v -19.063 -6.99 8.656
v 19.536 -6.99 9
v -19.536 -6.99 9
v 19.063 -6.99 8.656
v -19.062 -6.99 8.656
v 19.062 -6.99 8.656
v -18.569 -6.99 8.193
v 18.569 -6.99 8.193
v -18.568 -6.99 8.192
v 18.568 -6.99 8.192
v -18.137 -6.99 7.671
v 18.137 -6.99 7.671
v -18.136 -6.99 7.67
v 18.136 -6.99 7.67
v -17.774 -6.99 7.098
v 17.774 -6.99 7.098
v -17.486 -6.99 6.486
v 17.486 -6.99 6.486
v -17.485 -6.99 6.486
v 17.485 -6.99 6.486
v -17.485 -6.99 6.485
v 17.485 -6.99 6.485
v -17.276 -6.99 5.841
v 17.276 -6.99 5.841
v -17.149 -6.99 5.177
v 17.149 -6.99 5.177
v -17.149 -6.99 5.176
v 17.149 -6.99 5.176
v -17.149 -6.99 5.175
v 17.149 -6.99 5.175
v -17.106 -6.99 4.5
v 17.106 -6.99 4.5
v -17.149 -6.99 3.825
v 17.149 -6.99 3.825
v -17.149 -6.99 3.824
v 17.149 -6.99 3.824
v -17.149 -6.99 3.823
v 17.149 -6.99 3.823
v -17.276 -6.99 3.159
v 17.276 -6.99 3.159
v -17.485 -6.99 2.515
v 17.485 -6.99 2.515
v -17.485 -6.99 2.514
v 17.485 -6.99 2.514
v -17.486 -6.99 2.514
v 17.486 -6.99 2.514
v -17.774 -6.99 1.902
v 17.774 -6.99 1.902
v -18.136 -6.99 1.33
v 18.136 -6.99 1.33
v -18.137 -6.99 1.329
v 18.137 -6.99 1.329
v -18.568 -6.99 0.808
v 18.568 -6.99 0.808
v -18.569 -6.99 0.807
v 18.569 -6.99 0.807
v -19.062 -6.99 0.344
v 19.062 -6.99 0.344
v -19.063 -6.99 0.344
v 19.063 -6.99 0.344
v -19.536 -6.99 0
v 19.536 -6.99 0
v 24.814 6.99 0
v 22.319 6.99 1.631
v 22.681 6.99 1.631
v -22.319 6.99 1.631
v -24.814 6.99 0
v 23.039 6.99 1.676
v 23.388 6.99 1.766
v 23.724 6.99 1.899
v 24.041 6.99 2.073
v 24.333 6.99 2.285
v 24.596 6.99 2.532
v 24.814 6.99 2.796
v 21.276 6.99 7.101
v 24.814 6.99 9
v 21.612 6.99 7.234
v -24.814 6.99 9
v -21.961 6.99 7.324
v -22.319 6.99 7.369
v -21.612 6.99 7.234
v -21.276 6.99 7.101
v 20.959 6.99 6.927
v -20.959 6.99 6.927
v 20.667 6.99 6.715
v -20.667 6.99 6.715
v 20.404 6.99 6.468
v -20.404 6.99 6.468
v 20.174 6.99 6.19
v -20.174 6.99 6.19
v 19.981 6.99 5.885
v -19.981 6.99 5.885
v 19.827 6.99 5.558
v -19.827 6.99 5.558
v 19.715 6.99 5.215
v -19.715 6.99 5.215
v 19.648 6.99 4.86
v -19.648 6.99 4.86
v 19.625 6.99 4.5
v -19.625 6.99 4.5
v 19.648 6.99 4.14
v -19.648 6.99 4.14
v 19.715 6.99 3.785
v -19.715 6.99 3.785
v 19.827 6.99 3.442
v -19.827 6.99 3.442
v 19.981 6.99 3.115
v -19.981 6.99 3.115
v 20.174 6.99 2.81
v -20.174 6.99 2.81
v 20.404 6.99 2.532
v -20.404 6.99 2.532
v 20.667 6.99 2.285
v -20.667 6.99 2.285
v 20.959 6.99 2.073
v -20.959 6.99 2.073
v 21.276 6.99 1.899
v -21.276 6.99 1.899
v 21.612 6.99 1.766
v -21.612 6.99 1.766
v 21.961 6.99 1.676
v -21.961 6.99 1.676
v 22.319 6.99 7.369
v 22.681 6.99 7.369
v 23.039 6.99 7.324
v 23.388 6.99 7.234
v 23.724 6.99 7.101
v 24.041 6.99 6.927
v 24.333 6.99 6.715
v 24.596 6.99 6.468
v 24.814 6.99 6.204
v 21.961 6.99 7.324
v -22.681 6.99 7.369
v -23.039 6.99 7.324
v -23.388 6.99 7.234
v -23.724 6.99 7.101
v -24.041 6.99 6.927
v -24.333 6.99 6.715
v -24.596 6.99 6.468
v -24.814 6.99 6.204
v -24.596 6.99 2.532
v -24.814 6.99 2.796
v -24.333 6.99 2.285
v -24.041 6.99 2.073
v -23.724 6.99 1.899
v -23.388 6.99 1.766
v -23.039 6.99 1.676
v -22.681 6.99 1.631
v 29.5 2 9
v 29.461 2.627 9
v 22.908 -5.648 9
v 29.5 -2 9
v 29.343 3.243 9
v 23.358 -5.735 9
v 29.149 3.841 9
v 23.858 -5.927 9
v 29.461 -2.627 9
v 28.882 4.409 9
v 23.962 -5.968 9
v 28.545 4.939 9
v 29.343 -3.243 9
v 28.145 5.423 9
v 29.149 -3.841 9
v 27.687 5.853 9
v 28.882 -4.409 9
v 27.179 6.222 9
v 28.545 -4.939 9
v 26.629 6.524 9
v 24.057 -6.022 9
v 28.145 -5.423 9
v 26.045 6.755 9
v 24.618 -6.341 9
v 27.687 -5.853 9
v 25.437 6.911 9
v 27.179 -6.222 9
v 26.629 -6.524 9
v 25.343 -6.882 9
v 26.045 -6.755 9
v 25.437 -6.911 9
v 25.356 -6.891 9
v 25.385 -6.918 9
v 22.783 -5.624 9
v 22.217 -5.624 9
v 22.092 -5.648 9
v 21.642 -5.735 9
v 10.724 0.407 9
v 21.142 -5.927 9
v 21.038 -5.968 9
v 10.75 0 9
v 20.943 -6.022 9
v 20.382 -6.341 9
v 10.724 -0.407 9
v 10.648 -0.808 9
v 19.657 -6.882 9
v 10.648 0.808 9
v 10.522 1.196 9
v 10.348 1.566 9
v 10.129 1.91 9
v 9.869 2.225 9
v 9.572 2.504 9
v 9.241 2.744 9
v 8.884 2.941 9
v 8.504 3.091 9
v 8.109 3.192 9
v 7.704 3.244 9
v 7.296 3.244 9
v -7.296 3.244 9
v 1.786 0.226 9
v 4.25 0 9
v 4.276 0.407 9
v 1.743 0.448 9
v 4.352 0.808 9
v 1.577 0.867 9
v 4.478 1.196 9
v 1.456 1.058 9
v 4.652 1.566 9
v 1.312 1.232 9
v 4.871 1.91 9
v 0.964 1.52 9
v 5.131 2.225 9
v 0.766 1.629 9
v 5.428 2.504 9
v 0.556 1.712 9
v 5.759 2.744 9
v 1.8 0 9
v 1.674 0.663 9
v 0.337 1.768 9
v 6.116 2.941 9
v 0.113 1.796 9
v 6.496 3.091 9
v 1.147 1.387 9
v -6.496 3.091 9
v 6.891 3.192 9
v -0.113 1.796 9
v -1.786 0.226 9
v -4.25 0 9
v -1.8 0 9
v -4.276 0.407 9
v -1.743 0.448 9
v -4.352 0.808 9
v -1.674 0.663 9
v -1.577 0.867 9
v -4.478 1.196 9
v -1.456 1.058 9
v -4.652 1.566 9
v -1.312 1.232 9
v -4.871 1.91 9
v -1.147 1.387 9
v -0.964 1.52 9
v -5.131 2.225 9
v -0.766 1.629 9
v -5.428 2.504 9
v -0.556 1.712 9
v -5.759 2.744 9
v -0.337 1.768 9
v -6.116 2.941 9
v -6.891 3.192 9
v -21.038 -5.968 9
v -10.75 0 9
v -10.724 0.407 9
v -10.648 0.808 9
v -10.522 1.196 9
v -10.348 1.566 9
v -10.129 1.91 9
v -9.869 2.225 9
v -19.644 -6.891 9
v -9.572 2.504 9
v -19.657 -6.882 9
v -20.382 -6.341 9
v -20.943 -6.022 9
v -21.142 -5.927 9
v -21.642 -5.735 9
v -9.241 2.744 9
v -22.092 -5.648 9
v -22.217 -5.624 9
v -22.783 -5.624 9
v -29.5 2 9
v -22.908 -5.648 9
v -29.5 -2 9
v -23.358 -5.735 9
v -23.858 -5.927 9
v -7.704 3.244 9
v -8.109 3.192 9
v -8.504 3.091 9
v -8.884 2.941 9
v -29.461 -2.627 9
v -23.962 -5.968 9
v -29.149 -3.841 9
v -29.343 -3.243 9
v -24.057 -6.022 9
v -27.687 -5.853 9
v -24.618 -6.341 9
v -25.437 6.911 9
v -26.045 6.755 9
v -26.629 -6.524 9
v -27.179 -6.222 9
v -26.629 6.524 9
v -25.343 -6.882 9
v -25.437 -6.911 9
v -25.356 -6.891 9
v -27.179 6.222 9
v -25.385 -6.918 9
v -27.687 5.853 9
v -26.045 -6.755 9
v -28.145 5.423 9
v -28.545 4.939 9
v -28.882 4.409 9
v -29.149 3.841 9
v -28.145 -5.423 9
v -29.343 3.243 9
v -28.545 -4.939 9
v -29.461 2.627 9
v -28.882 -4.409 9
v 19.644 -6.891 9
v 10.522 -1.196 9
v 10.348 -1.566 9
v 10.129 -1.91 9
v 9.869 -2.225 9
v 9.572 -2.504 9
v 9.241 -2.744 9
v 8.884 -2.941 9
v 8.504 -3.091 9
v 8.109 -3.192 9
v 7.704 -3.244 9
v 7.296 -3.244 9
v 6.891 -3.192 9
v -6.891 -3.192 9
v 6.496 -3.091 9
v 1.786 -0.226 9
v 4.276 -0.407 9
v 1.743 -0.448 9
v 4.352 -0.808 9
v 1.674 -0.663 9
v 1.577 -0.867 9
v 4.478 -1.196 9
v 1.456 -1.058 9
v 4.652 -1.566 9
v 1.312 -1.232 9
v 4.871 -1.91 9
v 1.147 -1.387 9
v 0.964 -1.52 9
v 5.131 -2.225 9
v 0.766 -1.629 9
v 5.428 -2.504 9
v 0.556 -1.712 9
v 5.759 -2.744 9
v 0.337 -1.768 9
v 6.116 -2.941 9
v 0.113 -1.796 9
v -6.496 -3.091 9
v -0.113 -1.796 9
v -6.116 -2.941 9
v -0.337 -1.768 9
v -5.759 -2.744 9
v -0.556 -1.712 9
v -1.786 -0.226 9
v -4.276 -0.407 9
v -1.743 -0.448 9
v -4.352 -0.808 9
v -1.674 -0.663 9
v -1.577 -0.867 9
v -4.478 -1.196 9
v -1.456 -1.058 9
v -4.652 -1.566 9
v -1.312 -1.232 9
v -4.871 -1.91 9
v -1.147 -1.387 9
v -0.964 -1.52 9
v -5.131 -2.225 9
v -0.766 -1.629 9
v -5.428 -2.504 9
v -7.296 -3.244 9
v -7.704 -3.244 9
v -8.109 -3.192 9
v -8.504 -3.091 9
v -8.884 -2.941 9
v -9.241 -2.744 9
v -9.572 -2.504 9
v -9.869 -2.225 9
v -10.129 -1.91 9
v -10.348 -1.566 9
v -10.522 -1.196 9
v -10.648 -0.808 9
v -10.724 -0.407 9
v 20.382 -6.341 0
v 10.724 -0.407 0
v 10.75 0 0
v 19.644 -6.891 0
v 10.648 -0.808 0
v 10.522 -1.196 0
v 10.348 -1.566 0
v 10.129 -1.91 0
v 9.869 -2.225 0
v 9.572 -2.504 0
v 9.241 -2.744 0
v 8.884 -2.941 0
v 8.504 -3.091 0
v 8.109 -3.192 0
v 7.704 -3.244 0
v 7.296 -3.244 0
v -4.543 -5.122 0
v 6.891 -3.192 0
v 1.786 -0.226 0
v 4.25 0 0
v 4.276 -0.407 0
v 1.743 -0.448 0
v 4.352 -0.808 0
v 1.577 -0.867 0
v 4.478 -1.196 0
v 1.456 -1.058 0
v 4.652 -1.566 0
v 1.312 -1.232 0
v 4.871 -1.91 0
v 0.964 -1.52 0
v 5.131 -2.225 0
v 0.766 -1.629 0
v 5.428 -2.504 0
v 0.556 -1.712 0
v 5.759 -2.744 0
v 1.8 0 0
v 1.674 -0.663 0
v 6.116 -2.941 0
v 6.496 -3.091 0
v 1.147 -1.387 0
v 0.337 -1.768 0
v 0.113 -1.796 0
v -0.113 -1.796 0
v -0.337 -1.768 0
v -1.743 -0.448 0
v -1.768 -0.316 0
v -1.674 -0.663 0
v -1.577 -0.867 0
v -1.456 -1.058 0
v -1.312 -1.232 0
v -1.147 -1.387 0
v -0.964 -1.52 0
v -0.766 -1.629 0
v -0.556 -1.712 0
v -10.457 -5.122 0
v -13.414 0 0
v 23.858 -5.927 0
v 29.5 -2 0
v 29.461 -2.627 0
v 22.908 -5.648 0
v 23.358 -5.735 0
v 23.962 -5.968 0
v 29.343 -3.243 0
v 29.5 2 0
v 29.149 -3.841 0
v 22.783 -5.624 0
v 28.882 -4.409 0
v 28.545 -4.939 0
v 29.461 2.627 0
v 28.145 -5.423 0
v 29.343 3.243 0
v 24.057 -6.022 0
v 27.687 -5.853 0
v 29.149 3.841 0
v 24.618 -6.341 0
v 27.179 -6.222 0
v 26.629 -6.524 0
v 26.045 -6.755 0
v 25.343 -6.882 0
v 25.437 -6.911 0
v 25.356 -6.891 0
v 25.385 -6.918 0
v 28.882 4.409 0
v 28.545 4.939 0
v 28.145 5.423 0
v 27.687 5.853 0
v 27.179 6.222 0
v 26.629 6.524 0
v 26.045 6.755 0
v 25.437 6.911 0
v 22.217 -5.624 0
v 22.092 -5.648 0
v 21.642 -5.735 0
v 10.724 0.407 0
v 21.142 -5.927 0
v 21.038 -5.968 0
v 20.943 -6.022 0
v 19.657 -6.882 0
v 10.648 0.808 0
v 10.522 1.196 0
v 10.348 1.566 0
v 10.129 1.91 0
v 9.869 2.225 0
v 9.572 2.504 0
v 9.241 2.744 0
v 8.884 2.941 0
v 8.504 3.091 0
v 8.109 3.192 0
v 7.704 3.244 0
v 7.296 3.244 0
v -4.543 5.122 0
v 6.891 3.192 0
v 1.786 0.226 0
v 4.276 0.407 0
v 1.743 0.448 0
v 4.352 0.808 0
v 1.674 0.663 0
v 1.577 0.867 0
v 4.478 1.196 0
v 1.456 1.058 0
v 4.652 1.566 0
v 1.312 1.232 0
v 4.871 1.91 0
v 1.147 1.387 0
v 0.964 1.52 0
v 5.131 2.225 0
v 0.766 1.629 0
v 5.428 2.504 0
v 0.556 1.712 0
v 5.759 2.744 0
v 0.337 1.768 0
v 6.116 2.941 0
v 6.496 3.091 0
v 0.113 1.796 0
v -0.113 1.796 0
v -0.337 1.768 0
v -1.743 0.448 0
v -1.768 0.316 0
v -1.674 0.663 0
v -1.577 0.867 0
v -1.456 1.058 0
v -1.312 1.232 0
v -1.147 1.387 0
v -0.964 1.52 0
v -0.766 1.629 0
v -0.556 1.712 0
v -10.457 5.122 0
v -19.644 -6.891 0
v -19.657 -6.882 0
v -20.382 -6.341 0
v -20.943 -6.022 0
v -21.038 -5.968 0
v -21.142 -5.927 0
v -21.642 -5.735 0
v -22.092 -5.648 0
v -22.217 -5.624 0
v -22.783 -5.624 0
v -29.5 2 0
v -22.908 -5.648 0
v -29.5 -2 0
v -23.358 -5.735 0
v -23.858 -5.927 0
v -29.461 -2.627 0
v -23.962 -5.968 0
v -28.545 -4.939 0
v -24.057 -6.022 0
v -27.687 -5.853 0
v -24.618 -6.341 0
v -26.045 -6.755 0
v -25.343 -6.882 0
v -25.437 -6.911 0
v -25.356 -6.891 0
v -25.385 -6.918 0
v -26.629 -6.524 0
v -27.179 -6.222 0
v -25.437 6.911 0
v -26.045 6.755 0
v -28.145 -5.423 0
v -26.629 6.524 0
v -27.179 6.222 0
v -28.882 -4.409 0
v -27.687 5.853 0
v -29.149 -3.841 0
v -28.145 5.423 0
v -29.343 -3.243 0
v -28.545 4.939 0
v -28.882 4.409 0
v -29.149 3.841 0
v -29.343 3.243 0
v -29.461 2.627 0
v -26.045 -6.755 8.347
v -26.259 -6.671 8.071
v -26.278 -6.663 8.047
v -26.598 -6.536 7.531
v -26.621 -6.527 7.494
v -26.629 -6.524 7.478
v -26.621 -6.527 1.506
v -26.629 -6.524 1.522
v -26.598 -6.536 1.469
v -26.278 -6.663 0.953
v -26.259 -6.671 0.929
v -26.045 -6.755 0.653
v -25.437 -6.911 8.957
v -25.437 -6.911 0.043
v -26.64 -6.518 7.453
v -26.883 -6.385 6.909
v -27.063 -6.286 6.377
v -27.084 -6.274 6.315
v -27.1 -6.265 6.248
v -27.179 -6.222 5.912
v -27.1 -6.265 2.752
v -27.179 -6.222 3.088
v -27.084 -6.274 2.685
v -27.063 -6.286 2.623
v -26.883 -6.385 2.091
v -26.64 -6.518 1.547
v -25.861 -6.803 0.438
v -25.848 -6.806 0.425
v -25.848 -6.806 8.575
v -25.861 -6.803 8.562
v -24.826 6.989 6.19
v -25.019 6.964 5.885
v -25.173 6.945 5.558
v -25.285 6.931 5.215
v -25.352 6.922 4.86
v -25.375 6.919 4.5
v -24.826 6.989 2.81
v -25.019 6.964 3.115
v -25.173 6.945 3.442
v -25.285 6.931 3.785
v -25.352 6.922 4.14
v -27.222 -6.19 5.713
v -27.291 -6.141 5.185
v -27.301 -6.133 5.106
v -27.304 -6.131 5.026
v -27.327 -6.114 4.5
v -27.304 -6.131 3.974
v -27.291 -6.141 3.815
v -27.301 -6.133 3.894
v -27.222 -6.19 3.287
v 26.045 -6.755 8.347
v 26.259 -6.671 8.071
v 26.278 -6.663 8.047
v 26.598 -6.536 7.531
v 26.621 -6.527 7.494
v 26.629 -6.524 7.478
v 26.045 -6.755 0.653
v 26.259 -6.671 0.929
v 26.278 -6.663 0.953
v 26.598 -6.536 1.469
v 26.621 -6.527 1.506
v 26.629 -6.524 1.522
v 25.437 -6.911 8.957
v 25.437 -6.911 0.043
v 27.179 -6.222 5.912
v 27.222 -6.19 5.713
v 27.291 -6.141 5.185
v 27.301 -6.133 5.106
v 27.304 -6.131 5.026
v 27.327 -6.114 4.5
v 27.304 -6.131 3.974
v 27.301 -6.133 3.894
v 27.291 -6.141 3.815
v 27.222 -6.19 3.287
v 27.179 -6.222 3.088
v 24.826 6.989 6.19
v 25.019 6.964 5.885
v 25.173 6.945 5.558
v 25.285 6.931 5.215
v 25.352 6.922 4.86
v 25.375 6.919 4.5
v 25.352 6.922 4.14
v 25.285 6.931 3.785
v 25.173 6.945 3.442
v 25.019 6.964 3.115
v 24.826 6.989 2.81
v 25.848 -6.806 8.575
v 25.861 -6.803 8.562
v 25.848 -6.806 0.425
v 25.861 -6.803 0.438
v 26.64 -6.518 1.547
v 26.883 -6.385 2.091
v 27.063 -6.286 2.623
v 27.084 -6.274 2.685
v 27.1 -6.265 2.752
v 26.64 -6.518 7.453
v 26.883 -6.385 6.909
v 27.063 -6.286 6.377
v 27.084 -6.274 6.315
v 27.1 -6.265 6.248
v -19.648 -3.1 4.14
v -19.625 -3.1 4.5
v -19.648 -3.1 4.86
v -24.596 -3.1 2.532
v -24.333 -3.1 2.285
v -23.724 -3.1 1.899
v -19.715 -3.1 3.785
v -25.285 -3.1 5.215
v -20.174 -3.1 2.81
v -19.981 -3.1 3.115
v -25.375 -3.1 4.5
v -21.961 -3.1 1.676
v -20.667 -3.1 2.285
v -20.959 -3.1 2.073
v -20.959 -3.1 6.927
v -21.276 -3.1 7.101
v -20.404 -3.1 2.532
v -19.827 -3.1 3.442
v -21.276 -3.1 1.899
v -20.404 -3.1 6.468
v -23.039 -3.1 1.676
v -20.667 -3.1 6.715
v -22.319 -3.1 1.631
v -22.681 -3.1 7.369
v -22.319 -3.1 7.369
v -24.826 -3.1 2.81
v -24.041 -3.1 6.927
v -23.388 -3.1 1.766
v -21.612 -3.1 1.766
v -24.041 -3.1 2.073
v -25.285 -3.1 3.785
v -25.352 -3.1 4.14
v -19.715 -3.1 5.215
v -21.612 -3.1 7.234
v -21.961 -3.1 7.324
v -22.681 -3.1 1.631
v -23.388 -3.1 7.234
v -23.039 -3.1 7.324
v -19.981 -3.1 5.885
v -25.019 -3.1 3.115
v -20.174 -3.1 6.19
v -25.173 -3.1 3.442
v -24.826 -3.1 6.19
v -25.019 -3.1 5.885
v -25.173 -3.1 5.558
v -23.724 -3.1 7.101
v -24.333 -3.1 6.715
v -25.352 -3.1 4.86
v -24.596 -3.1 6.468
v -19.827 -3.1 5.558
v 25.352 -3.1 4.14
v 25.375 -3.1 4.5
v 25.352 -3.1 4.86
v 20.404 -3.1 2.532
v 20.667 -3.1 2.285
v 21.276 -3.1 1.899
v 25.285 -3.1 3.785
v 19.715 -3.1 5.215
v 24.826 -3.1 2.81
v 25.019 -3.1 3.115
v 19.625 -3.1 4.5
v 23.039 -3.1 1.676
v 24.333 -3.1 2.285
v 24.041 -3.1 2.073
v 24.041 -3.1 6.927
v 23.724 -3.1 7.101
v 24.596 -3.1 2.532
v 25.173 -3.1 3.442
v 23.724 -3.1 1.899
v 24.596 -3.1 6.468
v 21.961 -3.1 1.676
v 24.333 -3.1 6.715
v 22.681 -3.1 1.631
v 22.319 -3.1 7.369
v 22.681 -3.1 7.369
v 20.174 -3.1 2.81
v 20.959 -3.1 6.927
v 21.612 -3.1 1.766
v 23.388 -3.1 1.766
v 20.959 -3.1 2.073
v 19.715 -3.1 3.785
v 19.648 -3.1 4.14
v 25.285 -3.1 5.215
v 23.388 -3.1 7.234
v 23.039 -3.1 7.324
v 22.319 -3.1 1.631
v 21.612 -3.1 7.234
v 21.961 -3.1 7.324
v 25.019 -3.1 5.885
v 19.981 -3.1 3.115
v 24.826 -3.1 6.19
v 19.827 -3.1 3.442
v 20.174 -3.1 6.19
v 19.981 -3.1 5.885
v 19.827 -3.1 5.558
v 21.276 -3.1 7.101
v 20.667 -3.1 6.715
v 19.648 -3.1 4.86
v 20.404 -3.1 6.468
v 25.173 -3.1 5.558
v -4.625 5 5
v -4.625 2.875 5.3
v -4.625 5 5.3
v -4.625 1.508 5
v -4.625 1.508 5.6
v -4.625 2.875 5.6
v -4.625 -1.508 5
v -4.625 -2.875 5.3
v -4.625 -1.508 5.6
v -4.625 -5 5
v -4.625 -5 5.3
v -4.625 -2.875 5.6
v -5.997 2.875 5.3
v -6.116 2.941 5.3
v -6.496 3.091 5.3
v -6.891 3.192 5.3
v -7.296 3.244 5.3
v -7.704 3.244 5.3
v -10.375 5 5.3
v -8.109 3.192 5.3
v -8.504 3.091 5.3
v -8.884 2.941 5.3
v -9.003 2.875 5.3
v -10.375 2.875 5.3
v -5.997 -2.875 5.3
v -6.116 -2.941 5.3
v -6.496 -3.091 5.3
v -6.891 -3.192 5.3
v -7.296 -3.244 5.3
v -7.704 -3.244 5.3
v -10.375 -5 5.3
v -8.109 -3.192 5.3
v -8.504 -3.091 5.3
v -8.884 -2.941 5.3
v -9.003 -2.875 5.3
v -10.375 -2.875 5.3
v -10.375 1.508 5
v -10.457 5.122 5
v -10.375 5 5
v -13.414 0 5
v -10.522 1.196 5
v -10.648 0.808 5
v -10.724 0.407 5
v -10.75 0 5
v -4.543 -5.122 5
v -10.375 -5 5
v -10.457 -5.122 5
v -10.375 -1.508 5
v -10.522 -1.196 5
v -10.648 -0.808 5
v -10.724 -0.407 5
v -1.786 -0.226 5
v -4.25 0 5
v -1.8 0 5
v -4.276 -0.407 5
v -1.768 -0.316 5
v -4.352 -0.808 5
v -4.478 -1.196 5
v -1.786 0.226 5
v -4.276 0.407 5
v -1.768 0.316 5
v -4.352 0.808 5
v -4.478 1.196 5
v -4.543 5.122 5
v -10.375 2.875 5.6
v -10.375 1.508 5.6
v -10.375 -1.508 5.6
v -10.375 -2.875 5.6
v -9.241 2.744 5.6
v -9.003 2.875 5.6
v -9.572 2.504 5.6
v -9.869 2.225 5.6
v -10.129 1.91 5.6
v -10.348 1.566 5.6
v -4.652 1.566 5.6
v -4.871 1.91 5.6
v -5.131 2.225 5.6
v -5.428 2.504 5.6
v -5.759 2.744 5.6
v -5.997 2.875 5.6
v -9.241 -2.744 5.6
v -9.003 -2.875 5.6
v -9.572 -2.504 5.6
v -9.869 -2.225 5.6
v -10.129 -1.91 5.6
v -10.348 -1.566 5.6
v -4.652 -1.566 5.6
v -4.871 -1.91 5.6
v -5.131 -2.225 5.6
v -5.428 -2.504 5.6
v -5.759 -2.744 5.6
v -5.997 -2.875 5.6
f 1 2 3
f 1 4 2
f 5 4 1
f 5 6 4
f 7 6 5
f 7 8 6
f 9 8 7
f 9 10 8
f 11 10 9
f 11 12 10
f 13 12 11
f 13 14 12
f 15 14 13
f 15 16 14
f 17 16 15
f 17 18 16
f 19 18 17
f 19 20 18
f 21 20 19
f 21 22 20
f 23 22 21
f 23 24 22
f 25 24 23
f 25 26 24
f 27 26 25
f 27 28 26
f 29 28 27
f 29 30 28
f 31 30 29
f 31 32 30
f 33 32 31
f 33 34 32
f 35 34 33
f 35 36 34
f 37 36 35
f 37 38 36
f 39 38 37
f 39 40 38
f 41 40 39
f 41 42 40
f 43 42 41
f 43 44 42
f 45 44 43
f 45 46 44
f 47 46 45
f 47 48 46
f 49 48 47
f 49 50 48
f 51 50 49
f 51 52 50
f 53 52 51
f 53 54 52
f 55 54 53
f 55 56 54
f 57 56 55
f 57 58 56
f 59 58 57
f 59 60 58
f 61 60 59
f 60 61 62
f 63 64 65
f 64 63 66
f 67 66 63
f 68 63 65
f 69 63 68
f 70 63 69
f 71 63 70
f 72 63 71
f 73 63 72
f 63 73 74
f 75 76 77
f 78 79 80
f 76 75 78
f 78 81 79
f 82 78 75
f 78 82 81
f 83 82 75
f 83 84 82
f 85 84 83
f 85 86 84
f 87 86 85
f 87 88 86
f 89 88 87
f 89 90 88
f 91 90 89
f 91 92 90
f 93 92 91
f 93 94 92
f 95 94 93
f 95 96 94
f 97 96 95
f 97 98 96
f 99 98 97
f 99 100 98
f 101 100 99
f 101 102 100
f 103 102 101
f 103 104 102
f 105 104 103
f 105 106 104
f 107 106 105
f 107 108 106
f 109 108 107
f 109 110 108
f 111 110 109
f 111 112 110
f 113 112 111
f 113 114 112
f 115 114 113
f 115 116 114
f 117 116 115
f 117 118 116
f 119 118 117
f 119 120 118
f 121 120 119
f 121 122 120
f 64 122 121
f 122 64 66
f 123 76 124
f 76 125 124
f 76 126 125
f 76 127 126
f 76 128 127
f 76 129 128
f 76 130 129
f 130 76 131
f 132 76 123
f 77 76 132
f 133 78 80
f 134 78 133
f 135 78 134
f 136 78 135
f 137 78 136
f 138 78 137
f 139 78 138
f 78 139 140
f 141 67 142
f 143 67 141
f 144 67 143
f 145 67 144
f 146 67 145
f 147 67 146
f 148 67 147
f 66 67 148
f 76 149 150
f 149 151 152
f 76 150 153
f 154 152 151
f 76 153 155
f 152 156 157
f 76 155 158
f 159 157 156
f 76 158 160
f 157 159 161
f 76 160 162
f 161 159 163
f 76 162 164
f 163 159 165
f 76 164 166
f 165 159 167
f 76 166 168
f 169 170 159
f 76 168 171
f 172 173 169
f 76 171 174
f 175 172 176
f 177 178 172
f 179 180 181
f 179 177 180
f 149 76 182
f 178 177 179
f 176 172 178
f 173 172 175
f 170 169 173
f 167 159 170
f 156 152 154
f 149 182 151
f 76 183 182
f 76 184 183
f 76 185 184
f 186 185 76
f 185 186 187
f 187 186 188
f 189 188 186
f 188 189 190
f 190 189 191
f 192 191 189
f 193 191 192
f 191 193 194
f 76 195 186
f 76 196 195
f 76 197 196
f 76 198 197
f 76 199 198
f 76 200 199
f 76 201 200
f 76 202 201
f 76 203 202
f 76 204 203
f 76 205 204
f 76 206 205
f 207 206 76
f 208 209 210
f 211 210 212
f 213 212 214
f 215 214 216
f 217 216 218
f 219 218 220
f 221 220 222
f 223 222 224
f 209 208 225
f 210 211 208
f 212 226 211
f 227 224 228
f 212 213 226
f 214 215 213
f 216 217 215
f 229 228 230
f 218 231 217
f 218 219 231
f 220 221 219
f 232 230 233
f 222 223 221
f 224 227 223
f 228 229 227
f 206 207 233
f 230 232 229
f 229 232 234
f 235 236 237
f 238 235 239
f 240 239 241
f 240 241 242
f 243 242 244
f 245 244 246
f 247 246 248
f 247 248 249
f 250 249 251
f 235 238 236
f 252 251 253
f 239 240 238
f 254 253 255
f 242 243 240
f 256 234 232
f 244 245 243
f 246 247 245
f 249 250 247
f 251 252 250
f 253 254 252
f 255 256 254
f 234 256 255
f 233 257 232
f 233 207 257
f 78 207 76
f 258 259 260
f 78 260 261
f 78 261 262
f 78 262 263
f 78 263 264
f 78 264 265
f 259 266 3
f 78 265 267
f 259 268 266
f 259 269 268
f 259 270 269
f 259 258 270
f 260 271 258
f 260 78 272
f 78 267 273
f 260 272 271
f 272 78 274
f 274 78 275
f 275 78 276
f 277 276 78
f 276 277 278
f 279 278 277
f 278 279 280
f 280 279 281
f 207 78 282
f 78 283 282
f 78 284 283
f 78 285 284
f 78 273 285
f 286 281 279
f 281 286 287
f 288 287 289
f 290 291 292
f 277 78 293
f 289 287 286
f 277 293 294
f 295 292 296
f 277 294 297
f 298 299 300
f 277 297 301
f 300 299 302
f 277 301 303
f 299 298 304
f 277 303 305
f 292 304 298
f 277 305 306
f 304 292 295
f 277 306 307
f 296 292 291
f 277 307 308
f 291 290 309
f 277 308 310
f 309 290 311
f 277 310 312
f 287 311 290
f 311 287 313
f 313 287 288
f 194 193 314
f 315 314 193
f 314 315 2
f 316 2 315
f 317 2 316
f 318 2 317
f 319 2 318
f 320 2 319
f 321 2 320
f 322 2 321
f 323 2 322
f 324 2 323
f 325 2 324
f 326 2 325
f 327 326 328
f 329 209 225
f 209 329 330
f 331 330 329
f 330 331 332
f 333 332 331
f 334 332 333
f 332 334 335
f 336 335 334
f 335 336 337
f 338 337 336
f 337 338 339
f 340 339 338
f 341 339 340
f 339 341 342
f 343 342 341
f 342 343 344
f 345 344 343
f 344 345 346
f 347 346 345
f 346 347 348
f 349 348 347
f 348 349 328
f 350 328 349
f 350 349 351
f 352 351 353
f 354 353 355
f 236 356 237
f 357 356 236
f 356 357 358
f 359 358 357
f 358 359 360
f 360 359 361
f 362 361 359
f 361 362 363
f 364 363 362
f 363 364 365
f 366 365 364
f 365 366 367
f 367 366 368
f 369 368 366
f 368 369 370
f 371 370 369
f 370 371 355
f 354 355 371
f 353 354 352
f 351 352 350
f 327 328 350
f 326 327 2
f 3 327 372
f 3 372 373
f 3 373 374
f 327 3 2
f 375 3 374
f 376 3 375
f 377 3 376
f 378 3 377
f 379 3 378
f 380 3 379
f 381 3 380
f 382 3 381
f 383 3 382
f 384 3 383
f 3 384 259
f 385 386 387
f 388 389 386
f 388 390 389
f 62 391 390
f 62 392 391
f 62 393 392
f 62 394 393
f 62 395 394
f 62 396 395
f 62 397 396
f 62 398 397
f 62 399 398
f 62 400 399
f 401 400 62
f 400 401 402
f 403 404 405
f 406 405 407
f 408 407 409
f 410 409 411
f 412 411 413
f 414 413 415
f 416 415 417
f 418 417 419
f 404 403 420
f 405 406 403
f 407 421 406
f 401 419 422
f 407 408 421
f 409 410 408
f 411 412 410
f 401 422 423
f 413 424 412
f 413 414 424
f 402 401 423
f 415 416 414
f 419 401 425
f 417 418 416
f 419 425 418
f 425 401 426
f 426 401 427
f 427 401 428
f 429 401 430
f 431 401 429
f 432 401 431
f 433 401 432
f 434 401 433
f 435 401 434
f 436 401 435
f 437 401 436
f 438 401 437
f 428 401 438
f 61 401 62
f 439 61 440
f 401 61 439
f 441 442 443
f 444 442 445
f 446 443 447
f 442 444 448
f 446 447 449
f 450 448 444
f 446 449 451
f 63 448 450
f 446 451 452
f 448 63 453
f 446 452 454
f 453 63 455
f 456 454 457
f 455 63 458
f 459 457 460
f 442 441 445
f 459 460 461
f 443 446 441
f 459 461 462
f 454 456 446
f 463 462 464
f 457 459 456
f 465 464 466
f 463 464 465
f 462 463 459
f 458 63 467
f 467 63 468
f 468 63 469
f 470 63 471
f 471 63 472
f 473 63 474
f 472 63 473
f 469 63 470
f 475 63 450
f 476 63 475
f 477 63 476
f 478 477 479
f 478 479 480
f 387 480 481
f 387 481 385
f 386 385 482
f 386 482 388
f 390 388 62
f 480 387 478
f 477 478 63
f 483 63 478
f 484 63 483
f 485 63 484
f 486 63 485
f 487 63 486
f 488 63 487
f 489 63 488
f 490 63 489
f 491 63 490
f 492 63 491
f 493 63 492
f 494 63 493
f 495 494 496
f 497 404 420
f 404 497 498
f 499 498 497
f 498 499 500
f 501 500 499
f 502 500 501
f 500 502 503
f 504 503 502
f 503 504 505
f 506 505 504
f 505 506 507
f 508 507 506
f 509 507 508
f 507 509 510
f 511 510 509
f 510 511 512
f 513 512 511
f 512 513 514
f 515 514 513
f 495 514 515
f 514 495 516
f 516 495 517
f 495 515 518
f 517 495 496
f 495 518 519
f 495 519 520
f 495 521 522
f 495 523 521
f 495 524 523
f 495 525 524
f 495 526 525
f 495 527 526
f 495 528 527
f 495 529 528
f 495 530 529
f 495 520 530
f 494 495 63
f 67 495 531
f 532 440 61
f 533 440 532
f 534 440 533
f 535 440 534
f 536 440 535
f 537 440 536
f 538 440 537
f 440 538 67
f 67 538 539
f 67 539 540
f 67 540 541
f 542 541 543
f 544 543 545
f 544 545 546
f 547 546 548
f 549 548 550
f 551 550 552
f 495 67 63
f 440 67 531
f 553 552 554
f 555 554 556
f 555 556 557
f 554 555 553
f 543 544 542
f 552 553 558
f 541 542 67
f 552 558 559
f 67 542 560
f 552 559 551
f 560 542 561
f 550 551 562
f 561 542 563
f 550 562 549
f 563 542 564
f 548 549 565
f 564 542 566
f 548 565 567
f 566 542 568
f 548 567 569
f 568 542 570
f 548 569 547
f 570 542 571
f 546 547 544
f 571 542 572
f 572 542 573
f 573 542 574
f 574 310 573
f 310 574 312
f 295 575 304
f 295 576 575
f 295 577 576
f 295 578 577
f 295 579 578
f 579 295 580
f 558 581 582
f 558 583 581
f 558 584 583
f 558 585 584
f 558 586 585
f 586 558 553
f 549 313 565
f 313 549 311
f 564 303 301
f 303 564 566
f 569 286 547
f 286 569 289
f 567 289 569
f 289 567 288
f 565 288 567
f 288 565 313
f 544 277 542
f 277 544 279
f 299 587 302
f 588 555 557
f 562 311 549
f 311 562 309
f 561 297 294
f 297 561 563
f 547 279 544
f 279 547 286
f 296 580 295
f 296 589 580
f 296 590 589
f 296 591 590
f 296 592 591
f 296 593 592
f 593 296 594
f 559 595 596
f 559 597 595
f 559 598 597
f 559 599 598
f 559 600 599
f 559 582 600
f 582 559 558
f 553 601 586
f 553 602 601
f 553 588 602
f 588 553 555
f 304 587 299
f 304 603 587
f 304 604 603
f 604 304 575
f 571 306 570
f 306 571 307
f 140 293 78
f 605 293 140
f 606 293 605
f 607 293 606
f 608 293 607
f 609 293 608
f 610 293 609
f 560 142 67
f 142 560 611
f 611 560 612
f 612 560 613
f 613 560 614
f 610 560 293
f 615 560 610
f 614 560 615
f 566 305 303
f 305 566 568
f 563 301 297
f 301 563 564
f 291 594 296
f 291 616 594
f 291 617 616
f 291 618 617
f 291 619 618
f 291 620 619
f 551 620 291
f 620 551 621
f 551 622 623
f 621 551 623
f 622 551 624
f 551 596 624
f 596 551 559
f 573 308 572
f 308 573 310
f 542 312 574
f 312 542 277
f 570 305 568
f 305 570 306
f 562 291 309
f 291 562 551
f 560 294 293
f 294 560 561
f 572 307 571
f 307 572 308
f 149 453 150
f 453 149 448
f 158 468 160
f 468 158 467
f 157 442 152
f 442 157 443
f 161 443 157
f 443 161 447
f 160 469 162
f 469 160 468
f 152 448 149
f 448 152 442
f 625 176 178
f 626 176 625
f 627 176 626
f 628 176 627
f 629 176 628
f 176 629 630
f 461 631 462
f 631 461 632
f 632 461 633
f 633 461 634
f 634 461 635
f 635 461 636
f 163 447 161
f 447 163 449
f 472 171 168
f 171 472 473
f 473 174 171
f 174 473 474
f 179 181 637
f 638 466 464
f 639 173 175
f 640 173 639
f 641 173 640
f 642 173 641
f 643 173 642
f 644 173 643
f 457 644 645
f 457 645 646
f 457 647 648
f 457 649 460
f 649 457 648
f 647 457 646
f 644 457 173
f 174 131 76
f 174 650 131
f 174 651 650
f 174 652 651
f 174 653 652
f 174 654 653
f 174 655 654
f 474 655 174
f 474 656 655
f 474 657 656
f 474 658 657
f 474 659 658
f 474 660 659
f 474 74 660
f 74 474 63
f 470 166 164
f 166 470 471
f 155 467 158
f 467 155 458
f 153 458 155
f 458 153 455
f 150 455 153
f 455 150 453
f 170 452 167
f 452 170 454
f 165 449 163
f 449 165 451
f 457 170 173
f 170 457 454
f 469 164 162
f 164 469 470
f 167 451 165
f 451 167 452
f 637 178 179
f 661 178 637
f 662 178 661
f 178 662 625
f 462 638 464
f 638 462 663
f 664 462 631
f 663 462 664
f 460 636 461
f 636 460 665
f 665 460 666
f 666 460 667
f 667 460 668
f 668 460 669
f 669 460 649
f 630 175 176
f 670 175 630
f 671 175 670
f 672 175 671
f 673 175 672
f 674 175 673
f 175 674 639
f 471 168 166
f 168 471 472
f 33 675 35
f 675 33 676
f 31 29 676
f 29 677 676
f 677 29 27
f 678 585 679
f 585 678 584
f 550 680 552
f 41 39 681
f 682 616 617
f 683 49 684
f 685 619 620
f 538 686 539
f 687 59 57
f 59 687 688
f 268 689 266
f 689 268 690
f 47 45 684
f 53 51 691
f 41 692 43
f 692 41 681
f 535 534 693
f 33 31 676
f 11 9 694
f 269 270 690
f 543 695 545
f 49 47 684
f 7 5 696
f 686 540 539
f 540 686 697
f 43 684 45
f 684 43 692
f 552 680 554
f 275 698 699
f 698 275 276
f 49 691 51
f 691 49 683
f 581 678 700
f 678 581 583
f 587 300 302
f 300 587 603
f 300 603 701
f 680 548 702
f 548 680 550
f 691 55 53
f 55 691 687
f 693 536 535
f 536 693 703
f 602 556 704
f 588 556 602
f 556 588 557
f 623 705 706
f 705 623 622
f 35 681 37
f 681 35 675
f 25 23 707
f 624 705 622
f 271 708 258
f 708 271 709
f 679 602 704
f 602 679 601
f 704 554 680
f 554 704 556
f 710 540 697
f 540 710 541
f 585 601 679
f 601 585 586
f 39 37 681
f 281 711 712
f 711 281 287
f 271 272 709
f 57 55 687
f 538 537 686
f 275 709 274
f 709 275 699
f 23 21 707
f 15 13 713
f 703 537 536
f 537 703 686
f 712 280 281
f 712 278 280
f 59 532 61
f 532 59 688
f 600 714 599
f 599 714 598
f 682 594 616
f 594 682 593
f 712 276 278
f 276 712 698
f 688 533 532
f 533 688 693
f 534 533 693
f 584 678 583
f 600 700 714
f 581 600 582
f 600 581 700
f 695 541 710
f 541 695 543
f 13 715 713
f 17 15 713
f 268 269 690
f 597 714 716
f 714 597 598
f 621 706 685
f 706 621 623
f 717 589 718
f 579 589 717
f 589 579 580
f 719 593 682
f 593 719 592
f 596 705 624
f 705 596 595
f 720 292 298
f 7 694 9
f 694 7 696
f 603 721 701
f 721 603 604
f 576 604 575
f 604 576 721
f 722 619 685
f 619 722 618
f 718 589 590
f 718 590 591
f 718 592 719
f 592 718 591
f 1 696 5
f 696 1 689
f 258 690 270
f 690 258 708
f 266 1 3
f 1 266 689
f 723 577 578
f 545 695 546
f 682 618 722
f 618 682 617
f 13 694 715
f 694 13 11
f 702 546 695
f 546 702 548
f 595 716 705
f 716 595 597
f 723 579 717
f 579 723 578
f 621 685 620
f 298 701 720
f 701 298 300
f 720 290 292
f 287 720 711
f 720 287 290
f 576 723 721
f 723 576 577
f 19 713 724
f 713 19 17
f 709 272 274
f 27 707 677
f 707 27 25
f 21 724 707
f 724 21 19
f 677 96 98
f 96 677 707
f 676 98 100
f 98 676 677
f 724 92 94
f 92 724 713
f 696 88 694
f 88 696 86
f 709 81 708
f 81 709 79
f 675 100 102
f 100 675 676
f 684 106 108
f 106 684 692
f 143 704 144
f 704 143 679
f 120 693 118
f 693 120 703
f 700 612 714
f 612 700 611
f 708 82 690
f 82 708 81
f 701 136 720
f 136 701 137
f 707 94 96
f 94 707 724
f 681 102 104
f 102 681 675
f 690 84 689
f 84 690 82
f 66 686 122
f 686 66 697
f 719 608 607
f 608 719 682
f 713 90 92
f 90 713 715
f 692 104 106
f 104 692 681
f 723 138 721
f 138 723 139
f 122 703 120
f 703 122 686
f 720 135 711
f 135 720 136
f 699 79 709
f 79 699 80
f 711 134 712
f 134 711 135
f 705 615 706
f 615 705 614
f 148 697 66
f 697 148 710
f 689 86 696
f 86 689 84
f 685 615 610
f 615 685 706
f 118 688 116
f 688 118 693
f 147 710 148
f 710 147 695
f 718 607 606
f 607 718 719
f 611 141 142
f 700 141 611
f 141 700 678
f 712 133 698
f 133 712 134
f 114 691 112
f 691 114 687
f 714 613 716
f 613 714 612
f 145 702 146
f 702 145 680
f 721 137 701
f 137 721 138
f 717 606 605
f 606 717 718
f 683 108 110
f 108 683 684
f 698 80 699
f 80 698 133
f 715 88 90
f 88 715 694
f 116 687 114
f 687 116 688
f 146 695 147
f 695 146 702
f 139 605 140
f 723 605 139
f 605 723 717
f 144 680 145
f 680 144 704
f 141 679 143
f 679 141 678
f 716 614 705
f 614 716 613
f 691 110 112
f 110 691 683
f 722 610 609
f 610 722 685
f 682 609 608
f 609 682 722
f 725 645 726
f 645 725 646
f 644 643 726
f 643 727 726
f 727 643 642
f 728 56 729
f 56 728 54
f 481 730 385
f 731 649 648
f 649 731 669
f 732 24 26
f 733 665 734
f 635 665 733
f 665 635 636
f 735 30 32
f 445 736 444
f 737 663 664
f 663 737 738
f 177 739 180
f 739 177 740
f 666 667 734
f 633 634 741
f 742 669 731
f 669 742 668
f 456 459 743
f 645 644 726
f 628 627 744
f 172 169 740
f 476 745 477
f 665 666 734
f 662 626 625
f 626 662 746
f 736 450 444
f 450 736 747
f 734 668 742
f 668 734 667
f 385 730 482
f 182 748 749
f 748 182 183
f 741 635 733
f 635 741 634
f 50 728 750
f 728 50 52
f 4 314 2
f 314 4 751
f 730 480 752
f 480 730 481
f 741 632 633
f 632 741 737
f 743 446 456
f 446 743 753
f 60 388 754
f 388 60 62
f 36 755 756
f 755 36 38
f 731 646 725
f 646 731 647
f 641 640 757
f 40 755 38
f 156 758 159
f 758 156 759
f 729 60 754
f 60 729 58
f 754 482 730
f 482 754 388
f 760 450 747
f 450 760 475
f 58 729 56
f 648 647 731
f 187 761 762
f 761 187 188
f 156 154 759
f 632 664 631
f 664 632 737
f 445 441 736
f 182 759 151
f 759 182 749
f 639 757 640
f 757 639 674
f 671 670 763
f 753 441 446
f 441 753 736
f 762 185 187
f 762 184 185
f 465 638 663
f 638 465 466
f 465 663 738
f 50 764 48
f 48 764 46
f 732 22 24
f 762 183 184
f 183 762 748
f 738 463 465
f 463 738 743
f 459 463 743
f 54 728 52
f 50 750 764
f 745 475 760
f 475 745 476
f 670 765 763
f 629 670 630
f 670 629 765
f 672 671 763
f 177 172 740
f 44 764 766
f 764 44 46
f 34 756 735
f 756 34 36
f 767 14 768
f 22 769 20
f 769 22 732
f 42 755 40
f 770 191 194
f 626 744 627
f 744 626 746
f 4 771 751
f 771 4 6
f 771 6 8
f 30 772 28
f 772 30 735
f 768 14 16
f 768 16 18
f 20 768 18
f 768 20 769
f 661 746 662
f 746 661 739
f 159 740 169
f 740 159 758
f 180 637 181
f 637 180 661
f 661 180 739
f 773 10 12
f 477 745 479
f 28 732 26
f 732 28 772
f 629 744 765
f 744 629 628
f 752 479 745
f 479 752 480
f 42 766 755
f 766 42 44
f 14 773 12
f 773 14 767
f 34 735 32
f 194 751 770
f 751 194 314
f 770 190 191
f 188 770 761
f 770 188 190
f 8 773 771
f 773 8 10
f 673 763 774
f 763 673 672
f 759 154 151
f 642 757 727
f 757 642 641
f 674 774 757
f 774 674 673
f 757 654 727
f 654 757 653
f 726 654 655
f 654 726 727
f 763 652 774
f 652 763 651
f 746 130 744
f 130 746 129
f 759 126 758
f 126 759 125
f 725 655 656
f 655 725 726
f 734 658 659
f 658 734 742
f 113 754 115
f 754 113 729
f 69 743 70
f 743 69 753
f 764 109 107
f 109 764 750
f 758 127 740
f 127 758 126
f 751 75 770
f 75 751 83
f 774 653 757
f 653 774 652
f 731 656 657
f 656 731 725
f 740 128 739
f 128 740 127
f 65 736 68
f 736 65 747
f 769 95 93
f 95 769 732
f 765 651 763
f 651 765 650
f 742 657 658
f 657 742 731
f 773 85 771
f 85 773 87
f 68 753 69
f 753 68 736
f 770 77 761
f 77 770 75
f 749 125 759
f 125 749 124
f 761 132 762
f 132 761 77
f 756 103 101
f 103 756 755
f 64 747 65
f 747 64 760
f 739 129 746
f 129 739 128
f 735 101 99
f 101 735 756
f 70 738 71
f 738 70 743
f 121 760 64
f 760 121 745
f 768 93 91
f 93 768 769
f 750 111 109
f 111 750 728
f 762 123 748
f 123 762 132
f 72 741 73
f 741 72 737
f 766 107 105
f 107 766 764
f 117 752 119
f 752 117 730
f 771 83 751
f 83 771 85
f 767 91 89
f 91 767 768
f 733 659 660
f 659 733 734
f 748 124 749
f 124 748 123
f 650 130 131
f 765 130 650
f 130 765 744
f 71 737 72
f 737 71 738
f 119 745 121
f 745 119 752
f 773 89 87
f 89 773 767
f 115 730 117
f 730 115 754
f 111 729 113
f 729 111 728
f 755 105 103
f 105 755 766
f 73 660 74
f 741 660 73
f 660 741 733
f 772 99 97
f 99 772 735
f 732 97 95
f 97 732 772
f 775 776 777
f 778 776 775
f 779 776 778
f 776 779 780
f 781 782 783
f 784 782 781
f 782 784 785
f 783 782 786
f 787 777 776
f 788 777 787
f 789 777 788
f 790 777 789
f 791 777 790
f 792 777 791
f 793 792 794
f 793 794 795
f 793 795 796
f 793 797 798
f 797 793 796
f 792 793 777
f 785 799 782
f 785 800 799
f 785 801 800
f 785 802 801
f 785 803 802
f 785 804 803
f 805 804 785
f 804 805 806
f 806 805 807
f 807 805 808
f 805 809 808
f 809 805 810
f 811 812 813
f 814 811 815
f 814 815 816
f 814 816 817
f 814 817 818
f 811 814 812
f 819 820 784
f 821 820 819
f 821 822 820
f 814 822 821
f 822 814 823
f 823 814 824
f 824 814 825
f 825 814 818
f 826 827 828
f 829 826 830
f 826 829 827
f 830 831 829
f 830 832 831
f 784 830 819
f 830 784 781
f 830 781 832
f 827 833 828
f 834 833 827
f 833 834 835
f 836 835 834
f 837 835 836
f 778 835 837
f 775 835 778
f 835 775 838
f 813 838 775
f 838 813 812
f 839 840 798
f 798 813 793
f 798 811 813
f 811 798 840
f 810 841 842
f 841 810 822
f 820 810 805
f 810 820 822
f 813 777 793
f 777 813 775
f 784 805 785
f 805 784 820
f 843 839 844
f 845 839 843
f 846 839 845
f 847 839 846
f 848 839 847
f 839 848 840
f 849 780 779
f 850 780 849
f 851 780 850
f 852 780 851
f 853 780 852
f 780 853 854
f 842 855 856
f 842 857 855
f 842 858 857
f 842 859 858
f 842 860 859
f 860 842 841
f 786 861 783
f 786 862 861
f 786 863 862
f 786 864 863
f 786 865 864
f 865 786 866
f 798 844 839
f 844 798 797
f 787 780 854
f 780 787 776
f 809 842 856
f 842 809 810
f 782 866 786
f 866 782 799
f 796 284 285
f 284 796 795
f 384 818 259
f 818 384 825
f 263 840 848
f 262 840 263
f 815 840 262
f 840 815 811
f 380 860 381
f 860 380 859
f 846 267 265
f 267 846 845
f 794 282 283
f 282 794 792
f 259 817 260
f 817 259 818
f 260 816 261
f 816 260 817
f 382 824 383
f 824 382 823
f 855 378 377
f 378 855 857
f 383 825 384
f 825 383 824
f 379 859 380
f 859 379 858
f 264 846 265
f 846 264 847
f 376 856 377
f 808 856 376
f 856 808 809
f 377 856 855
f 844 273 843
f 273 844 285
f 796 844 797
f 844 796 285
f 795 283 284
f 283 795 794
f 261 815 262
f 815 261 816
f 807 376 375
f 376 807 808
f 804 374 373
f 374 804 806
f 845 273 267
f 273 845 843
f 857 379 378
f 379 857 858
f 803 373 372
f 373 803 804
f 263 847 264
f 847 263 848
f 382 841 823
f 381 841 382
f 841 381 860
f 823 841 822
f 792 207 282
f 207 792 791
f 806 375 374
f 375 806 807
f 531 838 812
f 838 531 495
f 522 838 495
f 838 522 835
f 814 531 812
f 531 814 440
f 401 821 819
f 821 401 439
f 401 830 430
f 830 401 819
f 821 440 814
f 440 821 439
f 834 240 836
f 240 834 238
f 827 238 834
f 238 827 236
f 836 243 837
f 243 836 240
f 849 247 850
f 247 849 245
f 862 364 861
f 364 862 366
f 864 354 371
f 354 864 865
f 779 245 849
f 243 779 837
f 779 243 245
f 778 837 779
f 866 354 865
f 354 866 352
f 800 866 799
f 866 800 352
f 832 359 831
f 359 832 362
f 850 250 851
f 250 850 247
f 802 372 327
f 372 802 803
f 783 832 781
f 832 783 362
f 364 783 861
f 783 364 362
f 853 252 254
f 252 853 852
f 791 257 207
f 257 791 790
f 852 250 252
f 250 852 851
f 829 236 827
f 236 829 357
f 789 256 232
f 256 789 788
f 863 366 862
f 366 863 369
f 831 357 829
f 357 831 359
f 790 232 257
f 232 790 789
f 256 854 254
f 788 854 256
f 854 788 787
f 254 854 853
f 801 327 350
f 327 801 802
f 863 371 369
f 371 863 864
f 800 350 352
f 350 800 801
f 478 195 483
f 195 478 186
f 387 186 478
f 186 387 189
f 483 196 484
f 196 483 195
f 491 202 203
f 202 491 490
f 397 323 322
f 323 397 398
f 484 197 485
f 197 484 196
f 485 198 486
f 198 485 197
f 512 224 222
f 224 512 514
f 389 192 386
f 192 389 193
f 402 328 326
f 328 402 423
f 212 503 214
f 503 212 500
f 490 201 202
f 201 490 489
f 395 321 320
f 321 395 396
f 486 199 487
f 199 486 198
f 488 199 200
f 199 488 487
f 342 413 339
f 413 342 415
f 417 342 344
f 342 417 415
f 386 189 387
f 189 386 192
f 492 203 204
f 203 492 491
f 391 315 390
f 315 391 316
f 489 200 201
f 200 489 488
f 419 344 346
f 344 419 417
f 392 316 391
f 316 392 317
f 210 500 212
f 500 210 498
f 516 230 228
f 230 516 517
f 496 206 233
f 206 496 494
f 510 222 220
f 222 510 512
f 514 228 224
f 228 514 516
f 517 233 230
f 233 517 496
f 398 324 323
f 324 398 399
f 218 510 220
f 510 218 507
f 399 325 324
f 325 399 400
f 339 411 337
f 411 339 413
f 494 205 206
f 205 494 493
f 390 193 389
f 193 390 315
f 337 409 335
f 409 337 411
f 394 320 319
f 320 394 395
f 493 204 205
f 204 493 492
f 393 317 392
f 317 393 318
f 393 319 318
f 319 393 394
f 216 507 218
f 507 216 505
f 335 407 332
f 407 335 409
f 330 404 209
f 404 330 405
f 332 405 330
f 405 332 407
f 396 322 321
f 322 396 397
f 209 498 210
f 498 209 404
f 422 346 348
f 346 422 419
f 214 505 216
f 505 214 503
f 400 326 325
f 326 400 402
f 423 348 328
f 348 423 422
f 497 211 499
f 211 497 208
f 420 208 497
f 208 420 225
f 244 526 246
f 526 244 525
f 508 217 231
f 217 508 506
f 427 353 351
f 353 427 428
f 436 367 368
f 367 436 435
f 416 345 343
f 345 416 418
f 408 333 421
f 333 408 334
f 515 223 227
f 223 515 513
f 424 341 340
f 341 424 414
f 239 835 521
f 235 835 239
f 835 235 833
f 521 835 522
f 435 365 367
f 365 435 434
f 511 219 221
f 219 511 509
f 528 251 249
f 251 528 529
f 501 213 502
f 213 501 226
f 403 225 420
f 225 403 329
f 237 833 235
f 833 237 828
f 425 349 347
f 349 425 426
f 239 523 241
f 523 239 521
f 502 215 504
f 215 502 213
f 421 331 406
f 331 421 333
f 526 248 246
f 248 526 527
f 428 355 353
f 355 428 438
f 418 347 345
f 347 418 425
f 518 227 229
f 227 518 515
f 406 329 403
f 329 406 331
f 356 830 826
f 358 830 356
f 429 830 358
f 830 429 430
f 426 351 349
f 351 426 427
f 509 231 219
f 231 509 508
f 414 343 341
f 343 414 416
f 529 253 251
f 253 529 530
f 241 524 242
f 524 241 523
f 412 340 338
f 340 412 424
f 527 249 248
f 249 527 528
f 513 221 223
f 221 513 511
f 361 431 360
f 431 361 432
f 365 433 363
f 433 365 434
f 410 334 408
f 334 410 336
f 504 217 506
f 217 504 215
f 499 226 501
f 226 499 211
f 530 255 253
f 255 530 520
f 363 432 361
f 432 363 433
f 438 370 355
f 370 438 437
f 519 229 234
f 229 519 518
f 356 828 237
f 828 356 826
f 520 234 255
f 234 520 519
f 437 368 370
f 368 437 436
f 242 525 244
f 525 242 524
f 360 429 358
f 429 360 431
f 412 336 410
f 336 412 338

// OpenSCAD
$fn = 50;


difference() {
	union() {
		hull() {
			translate(v = [-9.5000000000, 2.0000000000, 0]) {
				cylinder(h = 9, r = 5);
			}
			translate(v = [9.5000000000, 2.0000000000, 0]) {
				cylinder(h = 9, r = 5);
			}
			translate(v = [-9.5000000000, -2.0000000000, 0]) {
				cylinder(h = 9, r = 5);
			}
			translate(v = [9.5000000000, -2.0000000000, 0]) {
				cylinder(h = 9, r = 5);
			}
		}
		translate(v = [-15.0000000000, 0.0000000000, 0]) {
			hull() {
				translate(v = [-9.5000000000, 2.0000000000, 0]) {
					cylinder(h = 9, r = 5);
				}
				translate(v = [9.5000000000, 2.0000000000, 0]) {
					cylinder(h = 9, r = 5);
				}
				translate(v = [-9.5000000000, -2.0000000000, 0]) {
					cylinder(h = 9, r = 5);
				}
				translate(v = [9.5000000000, -2.0000000000, 0]) {
					cylinder(h = 9, r = 5);
				}
			}
		}
		translate(v = [-15.0000000000, 0.0000000000, 0]) {
			hull() {
				translate(v = [-9.5000000000, 2.0000000000, 0]) {
					cylinder(h = 9, r = 5);
				}
				translate(v = [9.5000000000, 2.0000000000, 0]) {
					cylinder(h = 9, r = 5);
				}
				translate(v = [-9.5000000000, -2.0000000000, 0]) {
					cylinder(h = 9, r = 5);
				}
				translate(v = [9.5000000000, -2.0000000000, 0]) {
					cylinder(h = 9, r = 5);
				}
			}
		}
		translate(v = [15.0000000000, 0.0000000000, 0]) {
			hull() {
				translate(v = [-9.5000000000, 2.0000000000, 0]) {
					cylinder(h = 9, r = 5);
				}
				translate(v = [9.5000000000, 2.0000000000, 0]) {
					cylinder(h = 9, r = 5);
				}
				translate(v = [-9.5000000000, -2.0000000000, 0]) {
					cylinder(h = 9, r = 5);
				}
				translate(v = [9.5000000000, -2.0000000000, 0]) {
					cylinder(h = 9, r = 5);
				}
			}
		}
		translate(v = [15.0000000000, 0.0000000000, 0]) {
			hull() {
				translate(v = [-9.5000000000, 2.0000000000, 0]) {
					cylinder(h = 9, r = 5);
				}
				translate(v = [9.5000000000, 2.0000000000, 0]) {
					cylinder(h = 9, r = 5);
				}
				translate(v = [-9.5000000000, -2.0000000000, 0]) {
					cylinder(h = 9, r = 5);
				}
				translate(v = [9.5000000000, -2.0000000000, 0]) {
					cylinder(h = 9, r = 5);
				}
			}
		}
	}
	union() {
		translate(v = [-22.5000000000, -7.0000000000, 4.5000000000]) {
			rotate(a = [90, 0, 0]) {
				difference() {
					union() {
						#translate(v = [0, 0, -14.0000000000]) {
							cylinder(h = 14, r = 2.6000000000);
						}
						#translate(v = [0, 0, -3.9000000000]) {
							cylinder(h = 3.9000000000, r1 = 2.8750000000, r2 = 5.4000000000);
						}
						#translate(v = [0, 0, -14.0000000000]) {
							cylinder(h = 14, r = 2.8750000000);
						}
						#translate(v = [0, 0, -14.0000000000]) {
							cylinder(h = 14, r = 2.6000000000);
						}
					}
					union();
				}
			}
		}
		translate(v = [22.5000000000, -7.0000000000, 4.5000000000]) {
			rotate(a = [90, 0, 0]) {
				difference() {
					union() {
						#translate(v = [0, 0, -14.0000000000]) {
							cylinder(h = 14, r = 2.6000000000);
						}
						#translate(v = [0, 0, -3.9000000000]) {
							cylinder(h = 3.9000000000, r1 = 2.8750000000, r2 = 5.4000000000);
						}
						#translate(v = [0, 0, -14.0000000000]) {
							cylinder(h = 14, r = 2.8750000000);
						}
						#translate(v = [0, 0, -14.0000000000]) {
							cylinder(h = 14, r = 2.6000000000);
						}
					}
					union();
				}
			}
		}
		translate(v = [-7.5000000000, 0.0000000000, 0]) {
			rotate(a = [0, 0, 0]) {
				difference() {
					union() {
						#translate(v = [-2.8750000000, -5.0000000000, -0.3000000000]) {
							cube(size = [5.7500000000, 10, 0.3000000000]);
						}
						#translate(v = [-2.8750000000, -2.8750000000, -0.6000000000]) {
							cube(size = [5.7500000000, 5.7500000000, 0.3000000000]);
						}
						#translate(v = [-2.8750000000, -5.0000000000, 5]) {
							cube(size = [5.7500000000, 10, 0.3000000000]);
						}
						#translate(v = [-2.8750000000, -2.8750000000, 5.3000000000]) {
							cube(size = [5.7500000000, 5.7500000000, 0.3000000000]);
						}
						#translate(v = [0, 0, -100.0000000000]) {
							cylinder(h = 200, r = 3.2500000000);
						}
						#linear_extrude(height = 5) {
							polygon(points = [[5.9142500000, 0.0000000000], [2.9571250000, 5.1218907443], [-2.9571250000, 5.1218907443], [-5.9142500000, 0.0000000000], [-2.9571250000, -5.1218907443], [2.9571250000, -5.1218907443]]);
						}
						#translate(v = [-2.8750000000, -5.0000000000, -0.3000000000]) {
							cube(size = [5.7500000000, 10, 0.3000000000]);
						}
						#translate(v = [-2.8750000000, -2.8750000000, -0.6000000000]) {
							cube(size = [5.7500000000, 5.7500000000, 0.3000000000]);
						}
						#translate(v = [-2.8750000000, -5.0000000000, 5]) {
							cube(size = [5.7500000000, 10, 0.3000000000]);
						}
						#translate(v = [-2.8750000000, -2.8750000000, 5.3000000000]) {
							cube(size = [5.7500000000, 5.7500000000, 0.3000000000]);
						}
						#translate(v = [0, 0, -100.0000000000]) {
							cylinder(h = 200, r = 3.2500000000);
						}
						#translate(v = [-2.8750000000, -5.0000000000, -0.3000000000]) {
							cube(size = [5.7500000000, 10, 0.3000000000]);
						}
						#translate(v = [-2.8750000000, -2.8750000000, -0.6000000000]) {
							cube(size = [5.7500000000, 5.7500000000, 0.3000000000]);
						}
						#translate(v = [-2.8750000000, -5.0000000000, 5]) {
							cube(size = [5.7500000000, 10, 0.3000000000]);
						}
						#translate(v = [-2.8750000000, -2.8750000000, 5.3000000000]) {
							cube(size = [5.7500000000, 5.7500000000, 0.3000000000]);
						}
						#translate(v = [0, 0, -100.0000000000]) {
							cylinder(h = 200, r = 3.2500000000);
						}
					}
					union();
				}
			}
		}
		translate(v = [-7.5000000000, 0.0000000000, 0]) {
			translate(v = [0, 0, -100]) {
				cylinder(h = 200, r = 3.2500000000);
			}
		}
		translate(v = [7.5000000000, 0.0000000000, 0]) {
			translate(v = [0, 0, -100]) {
				cylinder(h = 200, r = 3.2500000000);
			}
		}
		translate(v = [-7.5000000000, 0.0000000000, 0]) {
			translate(v = [0, 0, -100]) {
				cylinder(h = 200, r = 1.8000000000);
			}
		}
		translate(v = [0, 0, -100]) {
			cylinder(h = 200, r = 1.8000000000);
		}
		translate(v = [7.5000000000, 0.0000000000, 0]) {
			translate(v = [0, 0, -100]) {
				cylinder(h = 200, r = 1.8000000000);
			}
		}
	}
}
